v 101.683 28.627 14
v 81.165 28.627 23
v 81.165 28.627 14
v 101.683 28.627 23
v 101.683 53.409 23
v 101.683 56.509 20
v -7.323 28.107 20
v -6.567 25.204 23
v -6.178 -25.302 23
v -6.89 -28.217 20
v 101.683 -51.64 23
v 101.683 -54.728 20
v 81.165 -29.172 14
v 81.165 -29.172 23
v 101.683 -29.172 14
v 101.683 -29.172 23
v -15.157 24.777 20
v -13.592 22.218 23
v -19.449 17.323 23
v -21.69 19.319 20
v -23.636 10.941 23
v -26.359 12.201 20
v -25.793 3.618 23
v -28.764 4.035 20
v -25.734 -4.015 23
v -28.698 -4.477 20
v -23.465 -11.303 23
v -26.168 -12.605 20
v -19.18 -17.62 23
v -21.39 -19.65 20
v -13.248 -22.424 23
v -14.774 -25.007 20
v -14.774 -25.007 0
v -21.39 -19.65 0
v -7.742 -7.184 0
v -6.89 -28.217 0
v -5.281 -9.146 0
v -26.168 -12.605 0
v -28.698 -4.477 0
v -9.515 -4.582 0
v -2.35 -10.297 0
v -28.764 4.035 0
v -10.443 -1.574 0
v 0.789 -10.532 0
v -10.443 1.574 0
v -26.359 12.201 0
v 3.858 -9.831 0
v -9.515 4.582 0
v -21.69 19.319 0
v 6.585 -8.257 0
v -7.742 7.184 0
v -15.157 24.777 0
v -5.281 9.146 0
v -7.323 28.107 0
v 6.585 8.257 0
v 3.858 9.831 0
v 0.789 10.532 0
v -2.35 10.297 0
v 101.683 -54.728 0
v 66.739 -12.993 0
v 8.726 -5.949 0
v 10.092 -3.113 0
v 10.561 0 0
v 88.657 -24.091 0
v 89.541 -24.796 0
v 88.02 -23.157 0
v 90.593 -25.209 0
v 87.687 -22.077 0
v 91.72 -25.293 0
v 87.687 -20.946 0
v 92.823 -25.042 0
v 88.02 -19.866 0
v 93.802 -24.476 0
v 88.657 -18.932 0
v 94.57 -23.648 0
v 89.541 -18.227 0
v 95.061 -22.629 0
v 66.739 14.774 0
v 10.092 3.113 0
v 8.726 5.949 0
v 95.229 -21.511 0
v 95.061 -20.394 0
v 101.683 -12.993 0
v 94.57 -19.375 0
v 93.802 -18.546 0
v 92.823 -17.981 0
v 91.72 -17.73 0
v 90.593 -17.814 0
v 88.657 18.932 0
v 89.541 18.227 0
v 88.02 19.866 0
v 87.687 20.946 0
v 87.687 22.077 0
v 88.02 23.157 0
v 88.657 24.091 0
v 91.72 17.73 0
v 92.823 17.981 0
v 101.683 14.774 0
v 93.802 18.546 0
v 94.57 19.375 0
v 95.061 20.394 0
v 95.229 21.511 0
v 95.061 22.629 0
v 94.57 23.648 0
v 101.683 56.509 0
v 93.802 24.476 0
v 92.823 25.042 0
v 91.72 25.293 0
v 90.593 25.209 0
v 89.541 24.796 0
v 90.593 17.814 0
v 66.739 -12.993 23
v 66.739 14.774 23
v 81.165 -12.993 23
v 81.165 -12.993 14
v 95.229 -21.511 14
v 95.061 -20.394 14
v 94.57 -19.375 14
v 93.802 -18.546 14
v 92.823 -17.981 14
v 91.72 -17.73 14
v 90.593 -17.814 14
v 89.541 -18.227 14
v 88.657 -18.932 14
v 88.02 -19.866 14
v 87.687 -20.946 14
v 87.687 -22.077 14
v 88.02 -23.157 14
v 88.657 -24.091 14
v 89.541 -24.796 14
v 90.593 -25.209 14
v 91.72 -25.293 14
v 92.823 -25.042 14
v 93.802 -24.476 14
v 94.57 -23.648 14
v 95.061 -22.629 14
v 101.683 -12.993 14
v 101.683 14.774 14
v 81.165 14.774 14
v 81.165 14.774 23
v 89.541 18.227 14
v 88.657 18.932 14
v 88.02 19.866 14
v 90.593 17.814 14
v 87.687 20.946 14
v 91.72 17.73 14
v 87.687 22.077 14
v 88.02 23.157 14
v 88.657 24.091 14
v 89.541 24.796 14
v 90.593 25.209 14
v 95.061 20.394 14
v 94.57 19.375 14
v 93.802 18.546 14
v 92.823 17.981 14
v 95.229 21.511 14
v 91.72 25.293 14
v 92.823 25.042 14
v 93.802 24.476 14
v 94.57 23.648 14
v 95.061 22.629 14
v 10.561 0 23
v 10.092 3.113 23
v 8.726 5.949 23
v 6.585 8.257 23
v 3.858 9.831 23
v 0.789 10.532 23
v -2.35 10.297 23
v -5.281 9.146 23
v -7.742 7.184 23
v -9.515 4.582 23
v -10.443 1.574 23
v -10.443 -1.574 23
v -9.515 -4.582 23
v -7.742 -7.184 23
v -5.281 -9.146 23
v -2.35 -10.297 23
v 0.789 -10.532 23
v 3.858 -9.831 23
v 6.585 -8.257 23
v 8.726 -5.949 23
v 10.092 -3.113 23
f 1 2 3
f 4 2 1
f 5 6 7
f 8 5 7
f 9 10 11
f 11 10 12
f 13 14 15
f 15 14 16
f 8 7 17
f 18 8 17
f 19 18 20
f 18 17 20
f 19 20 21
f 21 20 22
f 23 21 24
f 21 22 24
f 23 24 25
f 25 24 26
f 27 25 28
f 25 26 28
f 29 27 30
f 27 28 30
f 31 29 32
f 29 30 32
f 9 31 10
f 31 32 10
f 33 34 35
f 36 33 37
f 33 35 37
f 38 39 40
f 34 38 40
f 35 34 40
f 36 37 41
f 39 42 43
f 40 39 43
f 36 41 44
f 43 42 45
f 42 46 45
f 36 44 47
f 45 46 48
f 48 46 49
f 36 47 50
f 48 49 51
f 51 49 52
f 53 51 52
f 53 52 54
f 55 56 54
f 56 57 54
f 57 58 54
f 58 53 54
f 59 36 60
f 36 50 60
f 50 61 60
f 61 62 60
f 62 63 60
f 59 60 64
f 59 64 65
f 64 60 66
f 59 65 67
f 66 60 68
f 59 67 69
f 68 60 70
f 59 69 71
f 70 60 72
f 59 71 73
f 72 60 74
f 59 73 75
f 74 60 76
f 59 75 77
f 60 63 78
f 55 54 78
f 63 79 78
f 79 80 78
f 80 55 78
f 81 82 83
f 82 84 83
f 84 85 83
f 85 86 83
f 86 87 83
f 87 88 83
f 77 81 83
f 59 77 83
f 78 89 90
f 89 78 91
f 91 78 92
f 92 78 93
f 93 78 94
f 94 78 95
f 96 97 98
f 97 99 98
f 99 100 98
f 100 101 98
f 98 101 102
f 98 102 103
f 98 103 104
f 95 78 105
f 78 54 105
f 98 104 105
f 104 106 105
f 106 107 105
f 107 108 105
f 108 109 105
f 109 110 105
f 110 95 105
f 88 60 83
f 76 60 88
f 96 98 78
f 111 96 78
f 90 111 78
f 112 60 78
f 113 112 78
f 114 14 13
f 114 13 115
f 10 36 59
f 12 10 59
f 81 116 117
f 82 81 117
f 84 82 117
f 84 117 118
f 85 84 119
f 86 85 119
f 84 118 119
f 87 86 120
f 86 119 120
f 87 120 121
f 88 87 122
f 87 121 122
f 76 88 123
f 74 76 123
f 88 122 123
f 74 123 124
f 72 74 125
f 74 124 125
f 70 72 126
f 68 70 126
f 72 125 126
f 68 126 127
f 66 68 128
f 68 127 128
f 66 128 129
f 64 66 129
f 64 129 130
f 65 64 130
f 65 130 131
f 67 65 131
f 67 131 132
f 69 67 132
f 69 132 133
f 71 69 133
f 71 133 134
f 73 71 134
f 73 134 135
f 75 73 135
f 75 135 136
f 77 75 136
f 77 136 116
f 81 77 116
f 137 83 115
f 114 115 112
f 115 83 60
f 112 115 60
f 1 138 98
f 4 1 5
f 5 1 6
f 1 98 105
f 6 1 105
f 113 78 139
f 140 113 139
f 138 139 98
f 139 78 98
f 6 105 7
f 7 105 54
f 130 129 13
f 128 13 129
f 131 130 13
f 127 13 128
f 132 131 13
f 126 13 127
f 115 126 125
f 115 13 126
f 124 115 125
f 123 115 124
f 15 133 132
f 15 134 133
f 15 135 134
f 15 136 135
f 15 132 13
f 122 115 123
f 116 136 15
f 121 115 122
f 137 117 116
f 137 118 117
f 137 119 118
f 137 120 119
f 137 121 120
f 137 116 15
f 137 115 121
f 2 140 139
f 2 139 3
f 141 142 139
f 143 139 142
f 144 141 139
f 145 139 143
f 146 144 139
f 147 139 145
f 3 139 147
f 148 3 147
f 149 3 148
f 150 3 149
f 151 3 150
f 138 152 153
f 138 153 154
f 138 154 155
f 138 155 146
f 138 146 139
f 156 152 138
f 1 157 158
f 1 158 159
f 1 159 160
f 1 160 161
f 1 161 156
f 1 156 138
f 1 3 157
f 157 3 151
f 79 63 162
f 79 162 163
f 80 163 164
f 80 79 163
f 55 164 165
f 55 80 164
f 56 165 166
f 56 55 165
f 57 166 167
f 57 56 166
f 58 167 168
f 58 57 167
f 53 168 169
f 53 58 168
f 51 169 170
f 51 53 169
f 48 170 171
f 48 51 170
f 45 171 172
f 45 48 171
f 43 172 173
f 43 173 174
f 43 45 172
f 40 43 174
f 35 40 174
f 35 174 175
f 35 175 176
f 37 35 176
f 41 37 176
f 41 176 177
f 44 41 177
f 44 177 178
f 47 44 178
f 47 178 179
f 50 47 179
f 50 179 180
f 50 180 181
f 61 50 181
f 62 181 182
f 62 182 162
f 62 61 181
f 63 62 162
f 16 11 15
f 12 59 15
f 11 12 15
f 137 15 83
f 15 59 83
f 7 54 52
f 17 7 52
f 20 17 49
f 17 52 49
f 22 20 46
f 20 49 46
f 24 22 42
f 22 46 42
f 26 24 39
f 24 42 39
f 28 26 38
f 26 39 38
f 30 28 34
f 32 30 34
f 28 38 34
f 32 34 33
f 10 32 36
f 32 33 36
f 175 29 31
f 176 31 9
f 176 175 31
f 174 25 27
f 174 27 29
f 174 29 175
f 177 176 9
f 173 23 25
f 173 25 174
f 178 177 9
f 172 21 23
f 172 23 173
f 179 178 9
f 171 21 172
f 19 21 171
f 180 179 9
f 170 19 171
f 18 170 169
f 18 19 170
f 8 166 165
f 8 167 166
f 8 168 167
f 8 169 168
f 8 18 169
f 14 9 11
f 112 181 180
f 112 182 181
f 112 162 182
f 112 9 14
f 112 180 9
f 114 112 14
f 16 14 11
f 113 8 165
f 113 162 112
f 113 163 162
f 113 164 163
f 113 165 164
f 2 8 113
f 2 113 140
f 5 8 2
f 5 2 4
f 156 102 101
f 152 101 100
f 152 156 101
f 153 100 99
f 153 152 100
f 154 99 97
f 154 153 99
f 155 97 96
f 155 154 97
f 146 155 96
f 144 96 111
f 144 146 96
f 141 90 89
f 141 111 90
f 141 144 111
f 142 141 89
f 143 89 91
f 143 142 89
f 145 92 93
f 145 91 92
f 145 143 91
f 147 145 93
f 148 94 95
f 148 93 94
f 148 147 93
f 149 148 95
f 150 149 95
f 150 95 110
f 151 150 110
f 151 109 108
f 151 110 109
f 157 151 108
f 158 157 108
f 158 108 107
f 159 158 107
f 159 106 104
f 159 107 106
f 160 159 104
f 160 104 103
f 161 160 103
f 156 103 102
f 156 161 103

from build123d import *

# Parameters (mm, degrees)
SKETCH_R        = 10.561309
PAD_DEPTH       = 23
SKETCH001_W     = 33.65596
SKETCH001_H     = 57.798376
POCKET_DEPTH    = 9
CHAMFER_SIZE    = 3
SKETCH002_R     = 3.792362
POCKET001_DEPTH = 16


with BuildPart() as part:
    # Sketch → Pad (new body)
    with BuildSketch(Plane.XY):
        with BuildLine():
            Line((101.683037, 56.508842), (-7.323339, 28.107179))
            ThreePointArc((-7.323339, 28.107179), (-29.044704, -0.223526), (-6.889876, -28.216563))
            Line((-6.889876, -28.216563), (101.683037, -54.727728))
            Line((101.683037, -54.727728), (101.683037, -12.993235))
            Line((101.683037, -12.993235), (66.739337, -12.993235))
            Line((66.739337, -12.993235), (66.739337, 14.774349))
            Line((66.739337, 14.774349), (101.683037, 14.774349))
            Line((101.683037, 14.774349), (101.683037, 56.508842))
        make_face()
        Circle(SKETCH_R, mode=Mode.SUBTRACT)
    extrude(amount=PAD_DEPTH)

    # Sketch001 (on Face11 of Pad) → Pocket (cut)
    with BuildSketch(Plane.XY.offset(23)):
        with Locations((97.992905, -0.272637)):
            Rectangle(SKETCH001_W, SKETCH001_H)
    extrude(amount=-POCKET_DEPTH, mode=Mode.SUBTRACT)

    # Chamfer
    chamfer_edges = [part.edges().sort_by_distance(p)[0] for p in [
        (47.39658, -41.472145, 23),
        (-29.044704, -0.223526, 23),
        (47.179849, 42.30801, 23),
    ]]
    chamfer(chamfer_edges, length=CHAMFER_SIZE)

    # Sketch002 (on Face20 of Chamfer) → Pocket001 (cut)
    with BuildSketch(Plane.XY.offset(14)):
        with Locations((91.437004, -21.51132)):
            Circle(SKETCH002_R)
    pocket001 = extrude(amount=-POCKET001_DEPTH, mode=Mode.SUBTRACT)

    # Mirrored: Pocket001 across XZ
    add(pocket001.mirror(Plane.XZ), mode=Mode.SUBTRACT)


solid = part.part
